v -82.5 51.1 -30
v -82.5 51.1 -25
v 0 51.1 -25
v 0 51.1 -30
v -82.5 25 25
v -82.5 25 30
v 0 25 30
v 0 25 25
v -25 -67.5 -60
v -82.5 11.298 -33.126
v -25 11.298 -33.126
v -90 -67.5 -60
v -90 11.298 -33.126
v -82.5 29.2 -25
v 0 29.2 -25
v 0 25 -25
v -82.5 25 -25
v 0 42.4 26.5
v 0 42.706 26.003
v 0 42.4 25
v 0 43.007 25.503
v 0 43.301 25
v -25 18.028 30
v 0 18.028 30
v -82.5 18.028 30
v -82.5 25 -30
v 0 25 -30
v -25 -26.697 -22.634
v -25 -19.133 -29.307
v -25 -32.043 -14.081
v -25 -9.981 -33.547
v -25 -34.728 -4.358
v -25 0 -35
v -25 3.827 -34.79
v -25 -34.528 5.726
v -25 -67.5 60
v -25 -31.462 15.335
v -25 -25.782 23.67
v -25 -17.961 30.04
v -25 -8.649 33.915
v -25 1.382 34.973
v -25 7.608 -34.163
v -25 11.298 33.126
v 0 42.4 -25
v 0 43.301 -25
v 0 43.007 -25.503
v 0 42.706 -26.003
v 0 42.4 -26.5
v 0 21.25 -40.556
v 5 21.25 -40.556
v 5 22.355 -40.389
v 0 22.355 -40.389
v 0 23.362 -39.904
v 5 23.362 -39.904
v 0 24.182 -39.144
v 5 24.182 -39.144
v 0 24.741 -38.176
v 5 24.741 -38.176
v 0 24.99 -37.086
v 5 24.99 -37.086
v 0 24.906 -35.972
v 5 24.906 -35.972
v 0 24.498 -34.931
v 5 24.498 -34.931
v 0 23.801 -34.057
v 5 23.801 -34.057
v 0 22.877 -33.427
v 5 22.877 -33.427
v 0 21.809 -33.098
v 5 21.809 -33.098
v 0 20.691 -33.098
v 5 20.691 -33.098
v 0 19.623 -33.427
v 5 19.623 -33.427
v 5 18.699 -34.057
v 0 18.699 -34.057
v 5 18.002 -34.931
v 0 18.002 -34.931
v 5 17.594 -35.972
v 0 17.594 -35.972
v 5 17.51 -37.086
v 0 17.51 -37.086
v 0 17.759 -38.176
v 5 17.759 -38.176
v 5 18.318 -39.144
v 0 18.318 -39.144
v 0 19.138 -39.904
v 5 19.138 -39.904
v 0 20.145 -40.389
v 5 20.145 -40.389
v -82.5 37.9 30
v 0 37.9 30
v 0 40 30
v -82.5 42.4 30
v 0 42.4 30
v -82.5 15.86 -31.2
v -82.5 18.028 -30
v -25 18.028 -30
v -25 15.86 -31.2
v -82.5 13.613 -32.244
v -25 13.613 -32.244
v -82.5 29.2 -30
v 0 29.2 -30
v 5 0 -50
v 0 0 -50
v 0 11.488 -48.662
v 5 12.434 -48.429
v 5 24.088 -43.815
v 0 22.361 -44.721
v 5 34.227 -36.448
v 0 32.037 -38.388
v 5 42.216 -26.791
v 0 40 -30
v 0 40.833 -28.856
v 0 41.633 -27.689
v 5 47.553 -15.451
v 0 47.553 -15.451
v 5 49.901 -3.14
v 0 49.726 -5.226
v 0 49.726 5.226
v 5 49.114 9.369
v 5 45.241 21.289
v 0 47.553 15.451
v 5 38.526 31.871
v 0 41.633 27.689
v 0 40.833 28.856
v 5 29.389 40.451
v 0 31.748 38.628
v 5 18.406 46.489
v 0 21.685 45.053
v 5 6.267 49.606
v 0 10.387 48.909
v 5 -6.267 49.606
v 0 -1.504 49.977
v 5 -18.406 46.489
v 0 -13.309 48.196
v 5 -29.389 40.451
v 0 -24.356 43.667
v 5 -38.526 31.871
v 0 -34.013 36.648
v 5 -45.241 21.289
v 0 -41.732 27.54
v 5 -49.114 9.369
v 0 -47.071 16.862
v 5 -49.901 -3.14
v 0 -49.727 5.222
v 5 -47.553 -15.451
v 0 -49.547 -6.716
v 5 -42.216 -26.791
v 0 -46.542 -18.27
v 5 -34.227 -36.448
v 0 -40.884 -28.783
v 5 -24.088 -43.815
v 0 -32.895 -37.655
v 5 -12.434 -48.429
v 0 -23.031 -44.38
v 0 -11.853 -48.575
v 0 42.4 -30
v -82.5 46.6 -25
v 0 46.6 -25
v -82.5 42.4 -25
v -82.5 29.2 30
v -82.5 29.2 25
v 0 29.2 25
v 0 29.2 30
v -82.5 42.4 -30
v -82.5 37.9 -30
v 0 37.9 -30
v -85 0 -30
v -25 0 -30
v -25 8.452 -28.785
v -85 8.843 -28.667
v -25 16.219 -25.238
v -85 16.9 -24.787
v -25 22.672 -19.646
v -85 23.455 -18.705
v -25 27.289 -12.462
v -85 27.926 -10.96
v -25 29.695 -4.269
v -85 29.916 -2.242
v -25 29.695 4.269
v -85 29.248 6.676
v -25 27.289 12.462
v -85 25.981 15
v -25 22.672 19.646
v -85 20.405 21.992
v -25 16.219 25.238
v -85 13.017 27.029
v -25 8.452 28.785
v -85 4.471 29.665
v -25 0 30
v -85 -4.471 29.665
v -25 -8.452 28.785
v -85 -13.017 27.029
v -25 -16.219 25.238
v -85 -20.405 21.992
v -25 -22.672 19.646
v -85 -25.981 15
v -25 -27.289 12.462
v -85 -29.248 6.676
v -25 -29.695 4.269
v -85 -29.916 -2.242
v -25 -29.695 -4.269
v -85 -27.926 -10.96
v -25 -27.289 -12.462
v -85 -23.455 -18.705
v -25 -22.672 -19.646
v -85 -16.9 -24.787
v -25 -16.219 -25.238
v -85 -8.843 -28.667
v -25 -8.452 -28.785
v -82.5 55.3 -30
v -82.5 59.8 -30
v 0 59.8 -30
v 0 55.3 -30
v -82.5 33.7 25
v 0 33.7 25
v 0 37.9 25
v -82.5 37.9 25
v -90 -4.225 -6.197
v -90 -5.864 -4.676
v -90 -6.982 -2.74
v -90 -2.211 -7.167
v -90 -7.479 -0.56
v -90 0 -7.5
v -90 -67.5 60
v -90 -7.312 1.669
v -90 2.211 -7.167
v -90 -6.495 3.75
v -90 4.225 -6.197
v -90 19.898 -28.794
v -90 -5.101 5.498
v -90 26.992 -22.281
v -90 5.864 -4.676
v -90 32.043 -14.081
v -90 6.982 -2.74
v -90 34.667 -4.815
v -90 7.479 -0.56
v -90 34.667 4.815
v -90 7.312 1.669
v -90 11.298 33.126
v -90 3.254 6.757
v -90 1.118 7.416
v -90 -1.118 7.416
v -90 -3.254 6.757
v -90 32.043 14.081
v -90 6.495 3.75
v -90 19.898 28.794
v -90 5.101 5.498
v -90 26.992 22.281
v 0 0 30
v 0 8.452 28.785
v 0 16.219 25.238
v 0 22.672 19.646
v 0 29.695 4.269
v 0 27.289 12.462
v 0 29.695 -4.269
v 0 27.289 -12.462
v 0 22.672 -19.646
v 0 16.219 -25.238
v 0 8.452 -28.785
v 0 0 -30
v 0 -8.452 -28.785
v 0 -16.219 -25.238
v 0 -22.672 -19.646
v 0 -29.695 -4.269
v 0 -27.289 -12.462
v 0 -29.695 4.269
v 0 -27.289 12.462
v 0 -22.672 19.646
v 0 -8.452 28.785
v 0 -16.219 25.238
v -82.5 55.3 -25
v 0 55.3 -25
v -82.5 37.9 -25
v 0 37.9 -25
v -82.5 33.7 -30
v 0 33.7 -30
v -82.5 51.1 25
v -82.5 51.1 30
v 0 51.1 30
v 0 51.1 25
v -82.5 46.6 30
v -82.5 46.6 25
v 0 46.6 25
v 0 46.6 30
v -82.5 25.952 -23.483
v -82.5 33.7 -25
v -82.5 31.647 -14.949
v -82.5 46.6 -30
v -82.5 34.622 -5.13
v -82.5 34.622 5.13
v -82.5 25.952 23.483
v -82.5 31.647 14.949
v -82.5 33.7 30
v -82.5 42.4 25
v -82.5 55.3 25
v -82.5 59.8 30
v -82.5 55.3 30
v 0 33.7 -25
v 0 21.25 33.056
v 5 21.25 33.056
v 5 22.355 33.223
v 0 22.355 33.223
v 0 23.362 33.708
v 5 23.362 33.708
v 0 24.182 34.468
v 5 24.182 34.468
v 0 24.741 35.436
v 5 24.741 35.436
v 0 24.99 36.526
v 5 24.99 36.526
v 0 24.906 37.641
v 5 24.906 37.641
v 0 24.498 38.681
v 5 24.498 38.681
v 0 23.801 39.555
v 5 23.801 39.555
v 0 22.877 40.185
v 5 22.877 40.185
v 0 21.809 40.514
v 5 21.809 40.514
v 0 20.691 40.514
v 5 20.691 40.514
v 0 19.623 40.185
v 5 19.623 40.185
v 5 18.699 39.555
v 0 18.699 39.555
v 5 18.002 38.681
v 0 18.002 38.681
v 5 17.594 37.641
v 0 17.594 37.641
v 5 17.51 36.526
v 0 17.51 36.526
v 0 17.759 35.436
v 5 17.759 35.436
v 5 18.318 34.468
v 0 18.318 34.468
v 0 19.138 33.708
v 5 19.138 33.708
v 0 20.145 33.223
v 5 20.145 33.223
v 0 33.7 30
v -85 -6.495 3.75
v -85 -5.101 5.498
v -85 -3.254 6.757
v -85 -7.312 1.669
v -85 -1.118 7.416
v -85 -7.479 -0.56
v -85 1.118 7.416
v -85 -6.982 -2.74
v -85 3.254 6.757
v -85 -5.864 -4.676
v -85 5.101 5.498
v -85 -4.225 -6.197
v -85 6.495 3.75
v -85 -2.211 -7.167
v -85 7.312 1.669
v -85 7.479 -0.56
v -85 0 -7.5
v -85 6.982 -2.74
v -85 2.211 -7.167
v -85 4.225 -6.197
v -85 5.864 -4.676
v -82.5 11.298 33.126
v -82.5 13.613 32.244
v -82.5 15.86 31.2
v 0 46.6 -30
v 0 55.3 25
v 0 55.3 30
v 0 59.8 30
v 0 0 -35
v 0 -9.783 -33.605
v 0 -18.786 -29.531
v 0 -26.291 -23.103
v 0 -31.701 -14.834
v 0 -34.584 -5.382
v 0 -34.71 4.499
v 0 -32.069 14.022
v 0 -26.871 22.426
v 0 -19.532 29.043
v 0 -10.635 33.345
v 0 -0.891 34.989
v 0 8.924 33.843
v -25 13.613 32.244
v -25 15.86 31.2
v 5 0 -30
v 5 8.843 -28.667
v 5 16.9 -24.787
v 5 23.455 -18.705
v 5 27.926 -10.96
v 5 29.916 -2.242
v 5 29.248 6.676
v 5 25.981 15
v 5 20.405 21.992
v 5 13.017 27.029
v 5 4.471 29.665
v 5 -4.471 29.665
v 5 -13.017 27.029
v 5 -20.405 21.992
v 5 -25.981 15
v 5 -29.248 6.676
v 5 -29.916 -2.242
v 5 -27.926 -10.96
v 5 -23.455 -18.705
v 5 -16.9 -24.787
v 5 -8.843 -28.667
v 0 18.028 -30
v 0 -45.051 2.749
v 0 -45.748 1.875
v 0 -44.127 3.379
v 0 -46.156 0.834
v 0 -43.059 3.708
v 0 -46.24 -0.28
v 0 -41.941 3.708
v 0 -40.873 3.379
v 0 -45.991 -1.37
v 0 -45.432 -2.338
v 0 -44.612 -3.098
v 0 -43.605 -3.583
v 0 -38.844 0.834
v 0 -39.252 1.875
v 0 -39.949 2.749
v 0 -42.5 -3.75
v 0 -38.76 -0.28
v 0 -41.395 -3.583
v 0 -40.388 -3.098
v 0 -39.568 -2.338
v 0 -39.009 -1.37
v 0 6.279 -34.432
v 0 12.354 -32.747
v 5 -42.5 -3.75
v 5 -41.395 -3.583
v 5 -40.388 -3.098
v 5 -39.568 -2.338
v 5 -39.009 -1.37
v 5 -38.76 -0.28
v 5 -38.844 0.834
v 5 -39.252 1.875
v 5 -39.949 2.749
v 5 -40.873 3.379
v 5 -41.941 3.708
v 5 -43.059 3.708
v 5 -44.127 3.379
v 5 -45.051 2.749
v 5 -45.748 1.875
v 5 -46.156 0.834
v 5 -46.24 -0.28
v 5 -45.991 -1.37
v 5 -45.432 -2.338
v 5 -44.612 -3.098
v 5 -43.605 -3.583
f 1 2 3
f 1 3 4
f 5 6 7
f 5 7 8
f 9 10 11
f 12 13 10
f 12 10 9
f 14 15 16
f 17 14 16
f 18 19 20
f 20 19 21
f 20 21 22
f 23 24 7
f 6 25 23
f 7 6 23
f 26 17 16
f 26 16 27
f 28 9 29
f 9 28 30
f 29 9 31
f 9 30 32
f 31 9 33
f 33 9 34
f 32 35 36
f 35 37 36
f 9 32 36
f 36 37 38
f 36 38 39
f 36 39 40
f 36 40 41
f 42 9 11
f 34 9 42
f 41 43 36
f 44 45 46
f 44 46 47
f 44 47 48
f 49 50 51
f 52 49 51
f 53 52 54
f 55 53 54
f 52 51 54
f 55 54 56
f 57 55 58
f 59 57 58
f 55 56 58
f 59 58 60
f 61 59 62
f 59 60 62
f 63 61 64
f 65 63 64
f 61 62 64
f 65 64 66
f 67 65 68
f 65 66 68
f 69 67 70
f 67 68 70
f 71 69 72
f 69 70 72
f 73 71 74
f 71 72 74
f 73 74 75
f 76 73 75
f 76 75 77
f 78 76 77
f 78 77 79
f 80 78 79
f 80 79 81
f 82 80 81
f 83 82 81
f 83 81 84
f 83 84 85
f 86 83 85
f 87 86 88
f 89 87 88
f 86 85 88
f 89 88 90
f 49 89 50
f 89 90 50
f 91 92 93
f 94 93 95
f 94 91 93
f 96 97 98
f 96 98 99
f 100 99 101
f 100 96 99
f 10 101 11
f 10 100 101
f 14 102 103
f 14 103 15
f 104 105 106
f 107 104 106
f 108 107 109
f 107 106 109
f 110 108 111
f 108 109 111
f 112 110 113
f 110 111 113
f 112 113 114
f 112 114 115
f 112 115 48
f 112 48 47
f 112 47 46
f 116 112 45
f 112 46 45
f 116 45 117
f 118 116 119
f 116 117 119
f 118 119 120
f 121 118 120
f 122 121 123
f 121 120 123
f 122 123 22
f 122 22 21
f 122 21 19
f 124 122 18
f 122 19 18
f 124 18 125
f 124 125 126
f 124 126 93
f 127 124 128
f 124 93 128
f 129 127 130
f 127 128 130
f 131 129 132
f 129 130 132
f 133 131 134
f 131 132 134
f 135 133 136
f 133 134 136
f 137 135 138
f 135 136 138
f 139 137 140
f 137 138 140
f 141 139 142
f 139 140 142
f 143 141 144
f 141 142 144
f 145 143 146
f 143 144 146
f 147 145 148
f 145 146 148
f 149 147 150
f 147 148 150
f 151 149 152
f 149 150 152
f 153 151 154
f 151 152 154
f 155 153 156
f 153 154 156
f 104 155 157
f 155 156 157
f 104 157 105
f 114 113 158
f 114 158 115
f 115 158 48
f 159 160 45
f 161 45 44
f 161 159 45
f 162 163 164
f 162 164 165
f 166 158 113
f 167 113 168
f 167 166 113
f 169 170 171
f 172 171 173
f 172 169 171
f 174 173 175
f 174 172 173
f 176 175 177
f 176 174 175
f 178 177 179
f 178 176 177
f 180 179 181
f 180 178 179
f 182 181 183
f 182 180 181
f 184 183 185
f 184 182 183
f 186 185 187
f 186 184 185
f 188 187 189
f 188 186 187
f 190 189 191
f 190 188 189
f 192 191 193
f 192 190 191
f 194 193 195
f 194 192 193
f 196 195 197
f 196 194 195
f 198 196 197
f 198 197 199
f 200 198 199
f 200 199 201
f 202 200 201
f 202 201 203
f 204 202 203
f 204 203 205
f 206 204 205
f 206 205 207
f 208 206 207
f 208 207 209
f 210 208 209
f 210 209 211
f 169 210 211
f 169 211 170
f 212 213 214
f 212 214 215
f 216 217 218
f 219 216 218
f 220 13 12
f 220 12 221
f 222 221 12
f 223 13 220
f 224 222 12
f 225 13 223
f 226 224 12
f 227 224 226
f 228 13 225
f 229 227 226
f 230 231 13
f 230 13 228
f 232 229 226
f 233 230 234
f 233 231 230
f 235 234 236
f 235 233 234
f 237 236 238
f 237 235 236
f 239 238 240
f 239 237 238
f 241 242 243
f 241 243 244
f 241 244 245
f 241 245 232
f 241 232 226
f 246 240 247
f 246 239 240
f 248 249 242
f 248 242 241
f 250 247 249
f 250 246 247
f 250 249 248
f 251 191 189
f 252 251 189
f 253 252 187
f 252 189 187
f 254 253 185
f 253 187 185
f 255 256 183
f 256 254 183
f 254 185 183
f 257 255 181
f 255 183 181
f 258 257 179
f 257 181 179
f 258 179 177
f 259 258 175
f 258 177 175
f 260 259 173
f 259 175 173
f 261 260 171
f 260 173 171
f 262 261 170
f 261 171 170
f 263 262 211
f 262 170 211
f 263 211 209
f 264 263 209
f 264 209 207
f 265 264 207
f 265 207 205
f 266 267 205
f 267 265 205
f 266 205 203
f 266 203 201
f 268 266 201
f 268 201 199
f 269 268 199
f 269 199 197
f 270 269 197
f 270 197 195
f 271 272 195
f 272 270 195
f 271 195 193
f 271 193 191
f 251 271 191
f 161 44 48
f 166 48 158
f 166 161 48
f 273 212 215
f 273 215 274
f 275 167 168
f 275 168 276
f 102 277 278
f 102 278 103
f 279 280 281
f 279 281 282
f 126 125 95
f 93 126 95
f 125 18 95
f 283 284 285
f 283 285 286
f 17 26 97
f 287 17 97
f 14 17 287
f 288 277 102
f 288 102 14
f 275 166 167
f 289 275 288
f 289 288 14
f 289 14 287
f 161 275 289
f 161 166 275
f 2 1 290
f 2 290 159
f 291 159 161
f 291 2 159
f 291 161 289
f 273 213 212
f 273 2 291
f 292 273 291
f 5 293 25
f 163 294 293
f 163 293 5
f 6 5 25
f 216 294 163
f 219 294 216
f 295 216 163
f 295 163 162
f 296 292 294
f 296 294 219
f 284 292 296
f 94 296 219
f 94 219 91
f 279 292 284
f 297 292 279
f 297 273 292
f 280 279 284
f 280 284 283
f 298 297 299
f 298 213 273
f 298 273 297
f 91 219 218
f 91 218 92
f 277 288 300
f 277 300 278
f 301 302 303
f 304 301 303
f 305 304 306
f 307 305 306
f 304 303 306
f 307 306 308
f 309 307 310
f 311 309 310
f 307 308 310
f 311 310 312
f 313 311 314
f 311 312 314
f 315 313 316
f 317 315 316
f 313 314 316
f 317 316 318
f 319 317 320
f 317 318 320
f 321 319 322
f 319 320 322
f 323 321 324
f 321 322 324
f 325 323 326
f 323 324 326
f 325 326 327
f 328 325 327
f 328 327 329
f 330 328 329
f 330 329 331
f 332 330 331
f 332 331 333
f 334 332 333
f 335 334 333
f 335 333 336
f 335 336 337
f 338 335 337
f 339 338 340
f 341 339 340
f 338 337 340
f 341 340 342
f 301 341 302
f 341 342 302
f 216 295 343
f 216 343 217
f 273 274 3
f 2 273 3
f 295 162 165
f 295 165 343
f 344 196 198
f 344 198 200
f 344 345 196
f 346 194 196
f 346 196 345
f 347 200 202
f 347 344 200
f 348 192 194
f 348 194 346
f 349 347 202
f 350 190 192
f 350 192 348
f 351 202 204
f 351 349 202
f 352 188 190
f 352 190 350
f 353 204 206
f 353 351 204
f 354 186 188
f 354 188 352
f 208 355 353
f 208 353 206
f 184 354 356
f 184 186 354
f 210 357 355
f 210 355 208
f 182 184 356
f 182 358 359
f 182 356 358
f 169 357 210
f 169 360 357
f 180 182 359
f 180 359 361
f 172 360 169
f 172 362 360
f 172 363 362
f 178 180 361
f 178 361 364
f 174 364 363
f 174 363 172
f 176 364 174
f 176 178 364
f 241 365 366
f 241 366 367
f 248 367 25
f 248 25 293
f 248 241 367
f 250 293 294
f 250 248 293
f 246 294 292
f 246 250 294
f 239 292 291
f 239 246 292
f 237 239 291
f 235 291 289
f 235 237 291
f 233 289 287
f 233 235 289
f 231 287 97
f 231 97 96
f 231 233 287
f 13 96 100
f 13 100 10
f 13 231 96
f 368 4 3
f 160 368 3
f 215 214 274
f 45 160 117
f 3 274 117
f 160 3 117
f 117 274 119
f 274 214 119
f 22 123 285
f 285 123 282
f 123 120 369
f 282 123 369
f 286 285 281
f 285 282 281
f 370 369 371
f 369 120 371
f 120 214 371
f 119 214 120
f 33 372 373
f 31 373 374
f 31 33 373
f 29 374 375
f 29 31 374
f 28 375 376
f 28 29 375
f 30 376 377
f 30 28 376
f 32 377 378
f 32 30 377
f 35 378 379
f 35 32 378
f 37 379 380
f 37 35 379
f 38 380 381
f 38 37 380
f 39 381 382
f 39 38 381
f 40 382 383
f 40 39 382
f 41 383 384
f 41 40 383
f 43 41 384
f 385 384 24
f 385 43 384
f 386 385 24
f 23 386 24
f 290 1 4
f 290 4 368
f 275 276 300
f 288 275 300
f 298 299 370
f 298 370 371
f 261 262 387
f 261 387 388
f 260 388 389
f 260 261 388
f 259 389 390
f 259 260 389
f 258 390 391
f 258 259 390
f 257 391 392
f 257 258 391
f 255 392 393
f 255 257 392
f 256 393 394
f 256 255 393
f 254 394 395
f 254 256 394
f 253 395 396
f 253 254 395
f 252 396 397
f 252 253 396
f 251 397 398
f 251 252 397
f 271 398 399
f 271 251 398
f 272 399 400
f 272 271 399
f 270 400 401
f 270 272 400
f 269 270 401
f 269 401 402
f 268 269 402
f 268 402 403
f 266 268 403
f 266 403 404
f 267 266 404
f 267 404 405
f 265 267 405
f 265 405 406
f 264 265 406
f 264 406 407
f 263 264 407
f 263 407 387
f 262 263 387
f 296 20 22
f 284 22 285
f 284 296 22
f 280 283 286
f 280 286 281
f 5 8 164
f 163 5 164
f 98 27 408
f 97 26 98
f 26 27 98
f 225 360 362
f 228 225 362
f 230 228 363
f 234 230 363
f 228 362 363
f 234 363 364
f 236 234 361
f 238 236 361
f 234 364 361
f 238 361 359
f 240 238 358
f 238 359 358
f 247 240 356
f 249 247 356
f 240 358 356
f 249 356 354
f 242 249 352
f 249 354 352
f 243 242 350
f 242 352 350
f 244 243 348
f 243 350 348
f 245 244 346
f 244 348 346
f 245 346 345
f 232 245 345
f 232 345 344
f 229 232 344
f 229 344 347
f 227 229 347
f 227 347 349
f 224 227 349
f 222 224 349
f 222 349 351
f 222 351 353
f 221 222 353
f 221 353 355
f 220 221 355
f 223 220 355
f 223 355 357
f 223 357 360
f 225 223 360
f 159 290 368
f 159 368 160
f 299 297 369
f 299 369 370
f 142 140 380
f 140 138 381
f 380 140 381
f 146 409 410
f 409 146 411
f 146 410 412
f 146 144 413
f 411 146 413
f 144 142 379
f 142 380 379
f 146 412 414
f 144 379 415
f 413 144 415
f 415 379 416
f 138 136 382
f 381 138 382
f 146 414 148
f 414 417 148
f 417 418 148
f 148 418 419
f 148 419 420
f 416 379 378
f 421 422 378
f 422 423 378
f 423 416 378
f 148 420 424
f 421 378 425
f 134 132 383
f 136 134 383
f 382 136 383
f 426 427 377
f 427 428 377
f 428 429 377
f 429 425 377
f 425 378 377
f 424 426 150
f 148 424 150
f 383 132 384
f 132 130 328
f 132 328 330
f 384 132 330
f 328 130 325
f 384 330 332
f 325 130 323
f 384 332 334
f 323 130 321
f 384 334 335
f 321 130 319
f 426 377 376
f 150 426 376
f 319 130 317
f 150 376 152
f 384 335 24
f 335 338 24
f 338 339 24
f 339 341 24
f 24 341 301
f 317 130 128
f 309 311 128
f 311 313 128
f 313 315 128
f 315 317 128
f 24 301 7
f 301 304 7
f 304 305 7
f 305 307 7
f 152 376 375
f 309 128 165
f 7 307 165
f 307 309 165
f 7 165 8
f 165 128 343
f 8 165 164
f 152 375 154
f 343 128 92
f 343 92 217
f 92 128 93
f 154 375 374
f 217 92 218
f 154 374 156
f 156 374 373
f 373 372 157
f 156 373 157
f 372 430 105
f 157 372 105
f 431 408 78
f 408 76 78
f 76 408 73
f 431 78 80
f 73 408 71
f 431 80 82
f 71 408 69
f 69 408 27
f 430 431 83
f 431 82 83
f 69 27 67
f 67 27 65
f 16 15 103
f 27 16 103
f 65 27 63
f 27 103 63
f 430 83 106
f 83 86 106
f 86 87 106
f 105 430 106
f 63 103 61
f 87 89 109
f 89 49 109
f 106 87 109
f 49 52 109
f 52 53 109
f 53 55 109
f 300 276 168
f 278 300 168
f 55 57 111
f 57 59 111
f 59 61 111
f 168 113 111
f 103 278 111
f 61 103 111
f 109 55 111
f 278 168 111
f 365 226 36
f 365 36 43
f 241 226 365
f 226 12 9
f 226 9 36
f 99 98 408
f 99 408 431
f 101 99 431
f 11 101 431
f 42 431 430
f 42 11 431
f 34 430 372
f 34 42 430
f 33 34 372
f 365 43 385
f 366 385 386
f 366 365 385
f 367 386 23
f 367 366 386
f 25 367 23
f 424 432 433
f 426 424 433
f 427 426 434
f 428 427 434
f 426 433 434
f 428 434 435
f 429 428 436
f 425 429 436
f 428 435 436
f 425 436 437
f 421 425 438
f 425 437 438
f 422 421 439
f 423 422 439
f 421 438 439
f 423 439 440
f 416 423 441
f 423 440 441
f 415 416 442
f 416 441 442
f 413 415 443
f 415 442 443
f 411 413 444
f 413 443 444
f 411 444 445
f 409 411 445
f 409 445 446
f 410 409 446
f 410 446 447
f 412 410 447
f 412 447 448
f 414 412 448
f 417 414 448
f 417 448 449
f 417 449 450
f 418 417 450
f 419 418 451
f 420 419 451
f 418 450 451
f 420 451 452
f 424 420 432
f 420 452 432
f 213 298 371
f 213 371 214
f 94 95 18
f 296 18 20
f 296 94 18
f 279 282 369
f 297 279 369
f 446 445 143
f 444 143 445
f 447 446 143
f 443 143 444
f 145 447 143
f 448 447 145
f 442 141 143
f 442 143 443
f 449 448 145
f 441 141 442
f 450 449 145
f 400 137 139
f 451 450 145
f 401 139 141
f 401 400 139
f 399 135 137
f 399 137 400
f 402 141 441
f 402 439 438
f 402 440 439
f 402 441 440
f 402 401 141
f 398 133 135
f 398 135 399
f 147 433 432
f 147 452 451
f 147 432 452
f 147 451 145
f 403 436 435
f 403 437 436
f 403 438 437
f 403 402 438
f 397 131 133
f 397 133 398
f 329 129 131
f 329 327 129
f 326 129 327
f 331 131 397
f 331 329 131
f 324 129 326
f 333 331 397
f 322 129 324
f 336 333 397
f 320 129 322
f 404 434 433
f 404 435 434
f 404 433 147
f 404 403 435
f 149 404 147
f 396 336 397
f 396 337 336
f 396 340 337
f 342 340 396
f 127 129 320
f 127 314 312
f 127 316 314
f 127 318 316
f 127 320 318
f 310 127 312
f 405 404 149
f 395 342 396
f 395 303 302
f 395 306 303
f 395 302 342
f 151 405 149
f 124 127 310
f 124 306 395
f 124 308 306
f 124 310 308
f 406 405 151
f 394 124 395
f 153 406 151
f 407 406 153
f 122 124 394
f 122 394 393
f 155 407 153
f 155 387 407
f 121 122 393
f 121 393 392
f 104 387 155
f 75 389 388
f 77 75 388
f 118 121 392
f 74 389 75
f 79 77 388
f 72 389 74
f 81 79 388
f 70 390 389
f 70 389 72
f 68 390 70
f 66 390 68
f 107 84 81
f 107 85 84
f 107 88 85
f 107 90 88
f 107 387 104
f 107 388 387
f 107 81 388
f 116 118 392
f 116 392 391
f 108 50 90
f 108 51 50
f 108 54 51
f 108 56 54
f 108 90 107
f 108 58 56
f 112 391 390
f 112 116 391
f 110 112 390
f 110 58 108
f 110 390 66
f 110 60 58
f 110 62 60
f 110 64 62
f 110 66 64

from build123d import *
from build123d.topology import SkipClean

# Parameters (mm, degrees)
SKETCH1_R           = 50
SKETCH1_R_2         = 30
BOSS_EXTRUDE1_DEPTH = 5
BOSS_EXTRUDE2_START = 82.5
SKETCH2_R           = 35
SKETCH2_R_2         = 30
BOSS_EXTRUDE2_DEPTH = 82.5
BOSS_EXTRUDE3_DEPTH = 65
SKETCH4_R           = 3.75
CUT_EXTRUDE2_DEPTH  = 5
BOSS_EXTRUDE4_START = 82.5
BOSS_EXTRUDE4_DEPTH = 82.5
SKETCH7_R           = 7.5
CUT_EXTRUDE3_DEPTH  = 112.271065421
CUT_EXTRUDE4_START  = -60
SKETCH8_R           = 30
CUT_EXTRUDE4_DEPTH  = 60


with BuildPart() as part:
    # Sketch1 → Boss-Extrude1 (new body)
    with BuildSketch(Plane(origin=(0, 0, 0), x_dir=(0, 0, -1), z_dir=(1, 0, 0))):
        Circle(SKETCH1_R)
        Circle(SKETCH1_R_2, mode=Mode.SUBTRACT)
    extrude(amount=BOSS_EXTRUDE1_DEPTH)

    # Sketch2 → Boss-Extrude2 (add)
    with SkipClean():  # the faces are left unmerged after this step: merging them gives an invalid solid
        with BuildSketch(Plane.ZY.offset(BOSS_EXTRUDE2_START)):
            with Locations(Location((0, 0, 0), (0, 0, 180))):
                Circle(SKETCH2_R)
            Circle(SKETCH2_R_2, mode=Mode.SUBTRACT)
        extrude(amount=-BOSS_EXTRUDE2_DEPTH)

    # Sketch3 → Boss-Extrude3 (add)
    with SkipClean():  # the faces are left unmerged after this step: merging them gives an invalid solid
        with BuildSketch(Plane.ZY.offset(90)):
            with BuildLine():
                Line((-60, -67.5), (60, -67.5))
                Line((60, -67.5), (33.12648335, 11.29761483))
                ThreePointArc((33.12648335, 11.29761483), (0, 35), (-33.12648335, 11.29761483))
                Line((-33.12648335, 11.29761483), (-60, -67.5))
            make_face()
        extrude(amount=-BOSS_EXTRUDE3_DEPTH)

    # Sketch4 → Cut-Extrude2 (cut)
    with SkipClean():  # the faces are left unmerged after this step: merging them gives an invalid solid
        with BuildSketch(Plane(origin=(5, 0, 0), x_dir=(0, 0, -1), z_dir=(1, 0, 0))):
            with Locations((0, -42.5)):
                Circle(SKETCH4_R)
            with Locations((-36.806079661, 21.25)):
                Circle(SKETCH4_R)
            with Locations((36.806079661, 21.25)):
                Circle(SKETCH4_R)
        extrude(amount=-CUT_EXTRUDE2_DEPTH, mode=Mode.SUBTRACT)

    # Sketch6 → Boss-Extrude4 (add)
    with SkipClean():  # the faces are left unmerged after this step: merging them gives an invalid solid
        with BuildSketch(Plane.ZY.offset(BOSS_EXTRUDE4_START)):
            with BuildLine():
                Line((-25, 25), (-30, 25))
                Line((-30, 25), (-30, 18.027756377))
                ThreePointArc((-30, 18.027756377), (0, 35), (30, 18.027756377))
                Line((30, 18.027756377), (30, 25))
                Line((30, 25), (25, 25))
                Line((25, 25), (25, 29.2))
                Line((25, 29.2), (30, 29.2))
                Line((30, 29.2), (30, 33.7))
                Line((30, 33.7), (25, 33.7))
                Line((25, 33.7), (25, 37.9))
                Line((25, 37.9), (30, 37.9))
                Line((30, 37.9), (30, 42.4))
                Line((30, 42.4), (25, 42.4))
                Line((25, 42.4), (25, 46.6))
                Line((25, 46.6), (30, 46.6))
                Line((30, 46.6), (30, 51.1))
                Line((30, 51.1), (25, 51.1))
                Line((25, 51.1), (25, 55.3))
                Line((25, 55.3), (30, 55.3))
                Line((30, 55.3), (30, 59.8))
                Line((30, 59.8), (-30, 59.8))
                Line((-30, 59.8), (-30, 55.3))
                Line((-30, 55.3), (-25, 55.3))
                Line((-25, 55.3), (-25, 51.1))
                Line((-25, 51.1), (-30, 51.1))
                Line((-30, 51.1), (-30, 46.6))
                Line((-30, 46.6), (-25, 46.6))
                Line((-25, 46.6), (-25, 42.4))
                Line((-25, 42.4), (-30, 42.4))
                Line((-30, 42.4), (-30, 37.9))
                Line((-30, 37.9), (-25, 37.9))
                Line((-25, 37.9), (-25, 33.7))
                Line((-25, 33.7), (-30, 33.7))
                Line((-30, 33.7), (-30, 29.2))
                Line((-30, 29.2), (-25, 29.2))
                Line((-25, 29.2), (-25, 25))
            make_face()
        extrude(amount=-BOSS_EXTRUDE4_DEPTH)

    # Sketch7 → Cut-Extrude3 (cut, through all)
    with SkipClean():  # the faces are left unmerged after this step: merging them gives an invalid solid
        with BuildSketch(Plane(origin=(-25, 0, 0), x_dir=(0, 0, -1), z_dir=(1, 0, 0))):
            Circle(SKETCH7_R)
        extrude(amount=-CUT_EXTRUDE3_DEPTH, mode=Mode.SUBTRACT)

    # Sketch8 → Cut-Extrude4 (cut)
    with SkipClean():  # the faces are left unmerged after this step: merging them gives an invalid solid
        with BuildSketch(Plane(origin=(-25, 0, 0), x_dir=(0, 0, -1), z_dir=(1, 0, 0)).offset(CUT_EXTRUDE4_START)):
            Circle(SKETCH8_R)
        extrude(amount=CUT_EXTRUDE4_DEPTH, mode=Mode.SUBTRACT)


solid = part.part
